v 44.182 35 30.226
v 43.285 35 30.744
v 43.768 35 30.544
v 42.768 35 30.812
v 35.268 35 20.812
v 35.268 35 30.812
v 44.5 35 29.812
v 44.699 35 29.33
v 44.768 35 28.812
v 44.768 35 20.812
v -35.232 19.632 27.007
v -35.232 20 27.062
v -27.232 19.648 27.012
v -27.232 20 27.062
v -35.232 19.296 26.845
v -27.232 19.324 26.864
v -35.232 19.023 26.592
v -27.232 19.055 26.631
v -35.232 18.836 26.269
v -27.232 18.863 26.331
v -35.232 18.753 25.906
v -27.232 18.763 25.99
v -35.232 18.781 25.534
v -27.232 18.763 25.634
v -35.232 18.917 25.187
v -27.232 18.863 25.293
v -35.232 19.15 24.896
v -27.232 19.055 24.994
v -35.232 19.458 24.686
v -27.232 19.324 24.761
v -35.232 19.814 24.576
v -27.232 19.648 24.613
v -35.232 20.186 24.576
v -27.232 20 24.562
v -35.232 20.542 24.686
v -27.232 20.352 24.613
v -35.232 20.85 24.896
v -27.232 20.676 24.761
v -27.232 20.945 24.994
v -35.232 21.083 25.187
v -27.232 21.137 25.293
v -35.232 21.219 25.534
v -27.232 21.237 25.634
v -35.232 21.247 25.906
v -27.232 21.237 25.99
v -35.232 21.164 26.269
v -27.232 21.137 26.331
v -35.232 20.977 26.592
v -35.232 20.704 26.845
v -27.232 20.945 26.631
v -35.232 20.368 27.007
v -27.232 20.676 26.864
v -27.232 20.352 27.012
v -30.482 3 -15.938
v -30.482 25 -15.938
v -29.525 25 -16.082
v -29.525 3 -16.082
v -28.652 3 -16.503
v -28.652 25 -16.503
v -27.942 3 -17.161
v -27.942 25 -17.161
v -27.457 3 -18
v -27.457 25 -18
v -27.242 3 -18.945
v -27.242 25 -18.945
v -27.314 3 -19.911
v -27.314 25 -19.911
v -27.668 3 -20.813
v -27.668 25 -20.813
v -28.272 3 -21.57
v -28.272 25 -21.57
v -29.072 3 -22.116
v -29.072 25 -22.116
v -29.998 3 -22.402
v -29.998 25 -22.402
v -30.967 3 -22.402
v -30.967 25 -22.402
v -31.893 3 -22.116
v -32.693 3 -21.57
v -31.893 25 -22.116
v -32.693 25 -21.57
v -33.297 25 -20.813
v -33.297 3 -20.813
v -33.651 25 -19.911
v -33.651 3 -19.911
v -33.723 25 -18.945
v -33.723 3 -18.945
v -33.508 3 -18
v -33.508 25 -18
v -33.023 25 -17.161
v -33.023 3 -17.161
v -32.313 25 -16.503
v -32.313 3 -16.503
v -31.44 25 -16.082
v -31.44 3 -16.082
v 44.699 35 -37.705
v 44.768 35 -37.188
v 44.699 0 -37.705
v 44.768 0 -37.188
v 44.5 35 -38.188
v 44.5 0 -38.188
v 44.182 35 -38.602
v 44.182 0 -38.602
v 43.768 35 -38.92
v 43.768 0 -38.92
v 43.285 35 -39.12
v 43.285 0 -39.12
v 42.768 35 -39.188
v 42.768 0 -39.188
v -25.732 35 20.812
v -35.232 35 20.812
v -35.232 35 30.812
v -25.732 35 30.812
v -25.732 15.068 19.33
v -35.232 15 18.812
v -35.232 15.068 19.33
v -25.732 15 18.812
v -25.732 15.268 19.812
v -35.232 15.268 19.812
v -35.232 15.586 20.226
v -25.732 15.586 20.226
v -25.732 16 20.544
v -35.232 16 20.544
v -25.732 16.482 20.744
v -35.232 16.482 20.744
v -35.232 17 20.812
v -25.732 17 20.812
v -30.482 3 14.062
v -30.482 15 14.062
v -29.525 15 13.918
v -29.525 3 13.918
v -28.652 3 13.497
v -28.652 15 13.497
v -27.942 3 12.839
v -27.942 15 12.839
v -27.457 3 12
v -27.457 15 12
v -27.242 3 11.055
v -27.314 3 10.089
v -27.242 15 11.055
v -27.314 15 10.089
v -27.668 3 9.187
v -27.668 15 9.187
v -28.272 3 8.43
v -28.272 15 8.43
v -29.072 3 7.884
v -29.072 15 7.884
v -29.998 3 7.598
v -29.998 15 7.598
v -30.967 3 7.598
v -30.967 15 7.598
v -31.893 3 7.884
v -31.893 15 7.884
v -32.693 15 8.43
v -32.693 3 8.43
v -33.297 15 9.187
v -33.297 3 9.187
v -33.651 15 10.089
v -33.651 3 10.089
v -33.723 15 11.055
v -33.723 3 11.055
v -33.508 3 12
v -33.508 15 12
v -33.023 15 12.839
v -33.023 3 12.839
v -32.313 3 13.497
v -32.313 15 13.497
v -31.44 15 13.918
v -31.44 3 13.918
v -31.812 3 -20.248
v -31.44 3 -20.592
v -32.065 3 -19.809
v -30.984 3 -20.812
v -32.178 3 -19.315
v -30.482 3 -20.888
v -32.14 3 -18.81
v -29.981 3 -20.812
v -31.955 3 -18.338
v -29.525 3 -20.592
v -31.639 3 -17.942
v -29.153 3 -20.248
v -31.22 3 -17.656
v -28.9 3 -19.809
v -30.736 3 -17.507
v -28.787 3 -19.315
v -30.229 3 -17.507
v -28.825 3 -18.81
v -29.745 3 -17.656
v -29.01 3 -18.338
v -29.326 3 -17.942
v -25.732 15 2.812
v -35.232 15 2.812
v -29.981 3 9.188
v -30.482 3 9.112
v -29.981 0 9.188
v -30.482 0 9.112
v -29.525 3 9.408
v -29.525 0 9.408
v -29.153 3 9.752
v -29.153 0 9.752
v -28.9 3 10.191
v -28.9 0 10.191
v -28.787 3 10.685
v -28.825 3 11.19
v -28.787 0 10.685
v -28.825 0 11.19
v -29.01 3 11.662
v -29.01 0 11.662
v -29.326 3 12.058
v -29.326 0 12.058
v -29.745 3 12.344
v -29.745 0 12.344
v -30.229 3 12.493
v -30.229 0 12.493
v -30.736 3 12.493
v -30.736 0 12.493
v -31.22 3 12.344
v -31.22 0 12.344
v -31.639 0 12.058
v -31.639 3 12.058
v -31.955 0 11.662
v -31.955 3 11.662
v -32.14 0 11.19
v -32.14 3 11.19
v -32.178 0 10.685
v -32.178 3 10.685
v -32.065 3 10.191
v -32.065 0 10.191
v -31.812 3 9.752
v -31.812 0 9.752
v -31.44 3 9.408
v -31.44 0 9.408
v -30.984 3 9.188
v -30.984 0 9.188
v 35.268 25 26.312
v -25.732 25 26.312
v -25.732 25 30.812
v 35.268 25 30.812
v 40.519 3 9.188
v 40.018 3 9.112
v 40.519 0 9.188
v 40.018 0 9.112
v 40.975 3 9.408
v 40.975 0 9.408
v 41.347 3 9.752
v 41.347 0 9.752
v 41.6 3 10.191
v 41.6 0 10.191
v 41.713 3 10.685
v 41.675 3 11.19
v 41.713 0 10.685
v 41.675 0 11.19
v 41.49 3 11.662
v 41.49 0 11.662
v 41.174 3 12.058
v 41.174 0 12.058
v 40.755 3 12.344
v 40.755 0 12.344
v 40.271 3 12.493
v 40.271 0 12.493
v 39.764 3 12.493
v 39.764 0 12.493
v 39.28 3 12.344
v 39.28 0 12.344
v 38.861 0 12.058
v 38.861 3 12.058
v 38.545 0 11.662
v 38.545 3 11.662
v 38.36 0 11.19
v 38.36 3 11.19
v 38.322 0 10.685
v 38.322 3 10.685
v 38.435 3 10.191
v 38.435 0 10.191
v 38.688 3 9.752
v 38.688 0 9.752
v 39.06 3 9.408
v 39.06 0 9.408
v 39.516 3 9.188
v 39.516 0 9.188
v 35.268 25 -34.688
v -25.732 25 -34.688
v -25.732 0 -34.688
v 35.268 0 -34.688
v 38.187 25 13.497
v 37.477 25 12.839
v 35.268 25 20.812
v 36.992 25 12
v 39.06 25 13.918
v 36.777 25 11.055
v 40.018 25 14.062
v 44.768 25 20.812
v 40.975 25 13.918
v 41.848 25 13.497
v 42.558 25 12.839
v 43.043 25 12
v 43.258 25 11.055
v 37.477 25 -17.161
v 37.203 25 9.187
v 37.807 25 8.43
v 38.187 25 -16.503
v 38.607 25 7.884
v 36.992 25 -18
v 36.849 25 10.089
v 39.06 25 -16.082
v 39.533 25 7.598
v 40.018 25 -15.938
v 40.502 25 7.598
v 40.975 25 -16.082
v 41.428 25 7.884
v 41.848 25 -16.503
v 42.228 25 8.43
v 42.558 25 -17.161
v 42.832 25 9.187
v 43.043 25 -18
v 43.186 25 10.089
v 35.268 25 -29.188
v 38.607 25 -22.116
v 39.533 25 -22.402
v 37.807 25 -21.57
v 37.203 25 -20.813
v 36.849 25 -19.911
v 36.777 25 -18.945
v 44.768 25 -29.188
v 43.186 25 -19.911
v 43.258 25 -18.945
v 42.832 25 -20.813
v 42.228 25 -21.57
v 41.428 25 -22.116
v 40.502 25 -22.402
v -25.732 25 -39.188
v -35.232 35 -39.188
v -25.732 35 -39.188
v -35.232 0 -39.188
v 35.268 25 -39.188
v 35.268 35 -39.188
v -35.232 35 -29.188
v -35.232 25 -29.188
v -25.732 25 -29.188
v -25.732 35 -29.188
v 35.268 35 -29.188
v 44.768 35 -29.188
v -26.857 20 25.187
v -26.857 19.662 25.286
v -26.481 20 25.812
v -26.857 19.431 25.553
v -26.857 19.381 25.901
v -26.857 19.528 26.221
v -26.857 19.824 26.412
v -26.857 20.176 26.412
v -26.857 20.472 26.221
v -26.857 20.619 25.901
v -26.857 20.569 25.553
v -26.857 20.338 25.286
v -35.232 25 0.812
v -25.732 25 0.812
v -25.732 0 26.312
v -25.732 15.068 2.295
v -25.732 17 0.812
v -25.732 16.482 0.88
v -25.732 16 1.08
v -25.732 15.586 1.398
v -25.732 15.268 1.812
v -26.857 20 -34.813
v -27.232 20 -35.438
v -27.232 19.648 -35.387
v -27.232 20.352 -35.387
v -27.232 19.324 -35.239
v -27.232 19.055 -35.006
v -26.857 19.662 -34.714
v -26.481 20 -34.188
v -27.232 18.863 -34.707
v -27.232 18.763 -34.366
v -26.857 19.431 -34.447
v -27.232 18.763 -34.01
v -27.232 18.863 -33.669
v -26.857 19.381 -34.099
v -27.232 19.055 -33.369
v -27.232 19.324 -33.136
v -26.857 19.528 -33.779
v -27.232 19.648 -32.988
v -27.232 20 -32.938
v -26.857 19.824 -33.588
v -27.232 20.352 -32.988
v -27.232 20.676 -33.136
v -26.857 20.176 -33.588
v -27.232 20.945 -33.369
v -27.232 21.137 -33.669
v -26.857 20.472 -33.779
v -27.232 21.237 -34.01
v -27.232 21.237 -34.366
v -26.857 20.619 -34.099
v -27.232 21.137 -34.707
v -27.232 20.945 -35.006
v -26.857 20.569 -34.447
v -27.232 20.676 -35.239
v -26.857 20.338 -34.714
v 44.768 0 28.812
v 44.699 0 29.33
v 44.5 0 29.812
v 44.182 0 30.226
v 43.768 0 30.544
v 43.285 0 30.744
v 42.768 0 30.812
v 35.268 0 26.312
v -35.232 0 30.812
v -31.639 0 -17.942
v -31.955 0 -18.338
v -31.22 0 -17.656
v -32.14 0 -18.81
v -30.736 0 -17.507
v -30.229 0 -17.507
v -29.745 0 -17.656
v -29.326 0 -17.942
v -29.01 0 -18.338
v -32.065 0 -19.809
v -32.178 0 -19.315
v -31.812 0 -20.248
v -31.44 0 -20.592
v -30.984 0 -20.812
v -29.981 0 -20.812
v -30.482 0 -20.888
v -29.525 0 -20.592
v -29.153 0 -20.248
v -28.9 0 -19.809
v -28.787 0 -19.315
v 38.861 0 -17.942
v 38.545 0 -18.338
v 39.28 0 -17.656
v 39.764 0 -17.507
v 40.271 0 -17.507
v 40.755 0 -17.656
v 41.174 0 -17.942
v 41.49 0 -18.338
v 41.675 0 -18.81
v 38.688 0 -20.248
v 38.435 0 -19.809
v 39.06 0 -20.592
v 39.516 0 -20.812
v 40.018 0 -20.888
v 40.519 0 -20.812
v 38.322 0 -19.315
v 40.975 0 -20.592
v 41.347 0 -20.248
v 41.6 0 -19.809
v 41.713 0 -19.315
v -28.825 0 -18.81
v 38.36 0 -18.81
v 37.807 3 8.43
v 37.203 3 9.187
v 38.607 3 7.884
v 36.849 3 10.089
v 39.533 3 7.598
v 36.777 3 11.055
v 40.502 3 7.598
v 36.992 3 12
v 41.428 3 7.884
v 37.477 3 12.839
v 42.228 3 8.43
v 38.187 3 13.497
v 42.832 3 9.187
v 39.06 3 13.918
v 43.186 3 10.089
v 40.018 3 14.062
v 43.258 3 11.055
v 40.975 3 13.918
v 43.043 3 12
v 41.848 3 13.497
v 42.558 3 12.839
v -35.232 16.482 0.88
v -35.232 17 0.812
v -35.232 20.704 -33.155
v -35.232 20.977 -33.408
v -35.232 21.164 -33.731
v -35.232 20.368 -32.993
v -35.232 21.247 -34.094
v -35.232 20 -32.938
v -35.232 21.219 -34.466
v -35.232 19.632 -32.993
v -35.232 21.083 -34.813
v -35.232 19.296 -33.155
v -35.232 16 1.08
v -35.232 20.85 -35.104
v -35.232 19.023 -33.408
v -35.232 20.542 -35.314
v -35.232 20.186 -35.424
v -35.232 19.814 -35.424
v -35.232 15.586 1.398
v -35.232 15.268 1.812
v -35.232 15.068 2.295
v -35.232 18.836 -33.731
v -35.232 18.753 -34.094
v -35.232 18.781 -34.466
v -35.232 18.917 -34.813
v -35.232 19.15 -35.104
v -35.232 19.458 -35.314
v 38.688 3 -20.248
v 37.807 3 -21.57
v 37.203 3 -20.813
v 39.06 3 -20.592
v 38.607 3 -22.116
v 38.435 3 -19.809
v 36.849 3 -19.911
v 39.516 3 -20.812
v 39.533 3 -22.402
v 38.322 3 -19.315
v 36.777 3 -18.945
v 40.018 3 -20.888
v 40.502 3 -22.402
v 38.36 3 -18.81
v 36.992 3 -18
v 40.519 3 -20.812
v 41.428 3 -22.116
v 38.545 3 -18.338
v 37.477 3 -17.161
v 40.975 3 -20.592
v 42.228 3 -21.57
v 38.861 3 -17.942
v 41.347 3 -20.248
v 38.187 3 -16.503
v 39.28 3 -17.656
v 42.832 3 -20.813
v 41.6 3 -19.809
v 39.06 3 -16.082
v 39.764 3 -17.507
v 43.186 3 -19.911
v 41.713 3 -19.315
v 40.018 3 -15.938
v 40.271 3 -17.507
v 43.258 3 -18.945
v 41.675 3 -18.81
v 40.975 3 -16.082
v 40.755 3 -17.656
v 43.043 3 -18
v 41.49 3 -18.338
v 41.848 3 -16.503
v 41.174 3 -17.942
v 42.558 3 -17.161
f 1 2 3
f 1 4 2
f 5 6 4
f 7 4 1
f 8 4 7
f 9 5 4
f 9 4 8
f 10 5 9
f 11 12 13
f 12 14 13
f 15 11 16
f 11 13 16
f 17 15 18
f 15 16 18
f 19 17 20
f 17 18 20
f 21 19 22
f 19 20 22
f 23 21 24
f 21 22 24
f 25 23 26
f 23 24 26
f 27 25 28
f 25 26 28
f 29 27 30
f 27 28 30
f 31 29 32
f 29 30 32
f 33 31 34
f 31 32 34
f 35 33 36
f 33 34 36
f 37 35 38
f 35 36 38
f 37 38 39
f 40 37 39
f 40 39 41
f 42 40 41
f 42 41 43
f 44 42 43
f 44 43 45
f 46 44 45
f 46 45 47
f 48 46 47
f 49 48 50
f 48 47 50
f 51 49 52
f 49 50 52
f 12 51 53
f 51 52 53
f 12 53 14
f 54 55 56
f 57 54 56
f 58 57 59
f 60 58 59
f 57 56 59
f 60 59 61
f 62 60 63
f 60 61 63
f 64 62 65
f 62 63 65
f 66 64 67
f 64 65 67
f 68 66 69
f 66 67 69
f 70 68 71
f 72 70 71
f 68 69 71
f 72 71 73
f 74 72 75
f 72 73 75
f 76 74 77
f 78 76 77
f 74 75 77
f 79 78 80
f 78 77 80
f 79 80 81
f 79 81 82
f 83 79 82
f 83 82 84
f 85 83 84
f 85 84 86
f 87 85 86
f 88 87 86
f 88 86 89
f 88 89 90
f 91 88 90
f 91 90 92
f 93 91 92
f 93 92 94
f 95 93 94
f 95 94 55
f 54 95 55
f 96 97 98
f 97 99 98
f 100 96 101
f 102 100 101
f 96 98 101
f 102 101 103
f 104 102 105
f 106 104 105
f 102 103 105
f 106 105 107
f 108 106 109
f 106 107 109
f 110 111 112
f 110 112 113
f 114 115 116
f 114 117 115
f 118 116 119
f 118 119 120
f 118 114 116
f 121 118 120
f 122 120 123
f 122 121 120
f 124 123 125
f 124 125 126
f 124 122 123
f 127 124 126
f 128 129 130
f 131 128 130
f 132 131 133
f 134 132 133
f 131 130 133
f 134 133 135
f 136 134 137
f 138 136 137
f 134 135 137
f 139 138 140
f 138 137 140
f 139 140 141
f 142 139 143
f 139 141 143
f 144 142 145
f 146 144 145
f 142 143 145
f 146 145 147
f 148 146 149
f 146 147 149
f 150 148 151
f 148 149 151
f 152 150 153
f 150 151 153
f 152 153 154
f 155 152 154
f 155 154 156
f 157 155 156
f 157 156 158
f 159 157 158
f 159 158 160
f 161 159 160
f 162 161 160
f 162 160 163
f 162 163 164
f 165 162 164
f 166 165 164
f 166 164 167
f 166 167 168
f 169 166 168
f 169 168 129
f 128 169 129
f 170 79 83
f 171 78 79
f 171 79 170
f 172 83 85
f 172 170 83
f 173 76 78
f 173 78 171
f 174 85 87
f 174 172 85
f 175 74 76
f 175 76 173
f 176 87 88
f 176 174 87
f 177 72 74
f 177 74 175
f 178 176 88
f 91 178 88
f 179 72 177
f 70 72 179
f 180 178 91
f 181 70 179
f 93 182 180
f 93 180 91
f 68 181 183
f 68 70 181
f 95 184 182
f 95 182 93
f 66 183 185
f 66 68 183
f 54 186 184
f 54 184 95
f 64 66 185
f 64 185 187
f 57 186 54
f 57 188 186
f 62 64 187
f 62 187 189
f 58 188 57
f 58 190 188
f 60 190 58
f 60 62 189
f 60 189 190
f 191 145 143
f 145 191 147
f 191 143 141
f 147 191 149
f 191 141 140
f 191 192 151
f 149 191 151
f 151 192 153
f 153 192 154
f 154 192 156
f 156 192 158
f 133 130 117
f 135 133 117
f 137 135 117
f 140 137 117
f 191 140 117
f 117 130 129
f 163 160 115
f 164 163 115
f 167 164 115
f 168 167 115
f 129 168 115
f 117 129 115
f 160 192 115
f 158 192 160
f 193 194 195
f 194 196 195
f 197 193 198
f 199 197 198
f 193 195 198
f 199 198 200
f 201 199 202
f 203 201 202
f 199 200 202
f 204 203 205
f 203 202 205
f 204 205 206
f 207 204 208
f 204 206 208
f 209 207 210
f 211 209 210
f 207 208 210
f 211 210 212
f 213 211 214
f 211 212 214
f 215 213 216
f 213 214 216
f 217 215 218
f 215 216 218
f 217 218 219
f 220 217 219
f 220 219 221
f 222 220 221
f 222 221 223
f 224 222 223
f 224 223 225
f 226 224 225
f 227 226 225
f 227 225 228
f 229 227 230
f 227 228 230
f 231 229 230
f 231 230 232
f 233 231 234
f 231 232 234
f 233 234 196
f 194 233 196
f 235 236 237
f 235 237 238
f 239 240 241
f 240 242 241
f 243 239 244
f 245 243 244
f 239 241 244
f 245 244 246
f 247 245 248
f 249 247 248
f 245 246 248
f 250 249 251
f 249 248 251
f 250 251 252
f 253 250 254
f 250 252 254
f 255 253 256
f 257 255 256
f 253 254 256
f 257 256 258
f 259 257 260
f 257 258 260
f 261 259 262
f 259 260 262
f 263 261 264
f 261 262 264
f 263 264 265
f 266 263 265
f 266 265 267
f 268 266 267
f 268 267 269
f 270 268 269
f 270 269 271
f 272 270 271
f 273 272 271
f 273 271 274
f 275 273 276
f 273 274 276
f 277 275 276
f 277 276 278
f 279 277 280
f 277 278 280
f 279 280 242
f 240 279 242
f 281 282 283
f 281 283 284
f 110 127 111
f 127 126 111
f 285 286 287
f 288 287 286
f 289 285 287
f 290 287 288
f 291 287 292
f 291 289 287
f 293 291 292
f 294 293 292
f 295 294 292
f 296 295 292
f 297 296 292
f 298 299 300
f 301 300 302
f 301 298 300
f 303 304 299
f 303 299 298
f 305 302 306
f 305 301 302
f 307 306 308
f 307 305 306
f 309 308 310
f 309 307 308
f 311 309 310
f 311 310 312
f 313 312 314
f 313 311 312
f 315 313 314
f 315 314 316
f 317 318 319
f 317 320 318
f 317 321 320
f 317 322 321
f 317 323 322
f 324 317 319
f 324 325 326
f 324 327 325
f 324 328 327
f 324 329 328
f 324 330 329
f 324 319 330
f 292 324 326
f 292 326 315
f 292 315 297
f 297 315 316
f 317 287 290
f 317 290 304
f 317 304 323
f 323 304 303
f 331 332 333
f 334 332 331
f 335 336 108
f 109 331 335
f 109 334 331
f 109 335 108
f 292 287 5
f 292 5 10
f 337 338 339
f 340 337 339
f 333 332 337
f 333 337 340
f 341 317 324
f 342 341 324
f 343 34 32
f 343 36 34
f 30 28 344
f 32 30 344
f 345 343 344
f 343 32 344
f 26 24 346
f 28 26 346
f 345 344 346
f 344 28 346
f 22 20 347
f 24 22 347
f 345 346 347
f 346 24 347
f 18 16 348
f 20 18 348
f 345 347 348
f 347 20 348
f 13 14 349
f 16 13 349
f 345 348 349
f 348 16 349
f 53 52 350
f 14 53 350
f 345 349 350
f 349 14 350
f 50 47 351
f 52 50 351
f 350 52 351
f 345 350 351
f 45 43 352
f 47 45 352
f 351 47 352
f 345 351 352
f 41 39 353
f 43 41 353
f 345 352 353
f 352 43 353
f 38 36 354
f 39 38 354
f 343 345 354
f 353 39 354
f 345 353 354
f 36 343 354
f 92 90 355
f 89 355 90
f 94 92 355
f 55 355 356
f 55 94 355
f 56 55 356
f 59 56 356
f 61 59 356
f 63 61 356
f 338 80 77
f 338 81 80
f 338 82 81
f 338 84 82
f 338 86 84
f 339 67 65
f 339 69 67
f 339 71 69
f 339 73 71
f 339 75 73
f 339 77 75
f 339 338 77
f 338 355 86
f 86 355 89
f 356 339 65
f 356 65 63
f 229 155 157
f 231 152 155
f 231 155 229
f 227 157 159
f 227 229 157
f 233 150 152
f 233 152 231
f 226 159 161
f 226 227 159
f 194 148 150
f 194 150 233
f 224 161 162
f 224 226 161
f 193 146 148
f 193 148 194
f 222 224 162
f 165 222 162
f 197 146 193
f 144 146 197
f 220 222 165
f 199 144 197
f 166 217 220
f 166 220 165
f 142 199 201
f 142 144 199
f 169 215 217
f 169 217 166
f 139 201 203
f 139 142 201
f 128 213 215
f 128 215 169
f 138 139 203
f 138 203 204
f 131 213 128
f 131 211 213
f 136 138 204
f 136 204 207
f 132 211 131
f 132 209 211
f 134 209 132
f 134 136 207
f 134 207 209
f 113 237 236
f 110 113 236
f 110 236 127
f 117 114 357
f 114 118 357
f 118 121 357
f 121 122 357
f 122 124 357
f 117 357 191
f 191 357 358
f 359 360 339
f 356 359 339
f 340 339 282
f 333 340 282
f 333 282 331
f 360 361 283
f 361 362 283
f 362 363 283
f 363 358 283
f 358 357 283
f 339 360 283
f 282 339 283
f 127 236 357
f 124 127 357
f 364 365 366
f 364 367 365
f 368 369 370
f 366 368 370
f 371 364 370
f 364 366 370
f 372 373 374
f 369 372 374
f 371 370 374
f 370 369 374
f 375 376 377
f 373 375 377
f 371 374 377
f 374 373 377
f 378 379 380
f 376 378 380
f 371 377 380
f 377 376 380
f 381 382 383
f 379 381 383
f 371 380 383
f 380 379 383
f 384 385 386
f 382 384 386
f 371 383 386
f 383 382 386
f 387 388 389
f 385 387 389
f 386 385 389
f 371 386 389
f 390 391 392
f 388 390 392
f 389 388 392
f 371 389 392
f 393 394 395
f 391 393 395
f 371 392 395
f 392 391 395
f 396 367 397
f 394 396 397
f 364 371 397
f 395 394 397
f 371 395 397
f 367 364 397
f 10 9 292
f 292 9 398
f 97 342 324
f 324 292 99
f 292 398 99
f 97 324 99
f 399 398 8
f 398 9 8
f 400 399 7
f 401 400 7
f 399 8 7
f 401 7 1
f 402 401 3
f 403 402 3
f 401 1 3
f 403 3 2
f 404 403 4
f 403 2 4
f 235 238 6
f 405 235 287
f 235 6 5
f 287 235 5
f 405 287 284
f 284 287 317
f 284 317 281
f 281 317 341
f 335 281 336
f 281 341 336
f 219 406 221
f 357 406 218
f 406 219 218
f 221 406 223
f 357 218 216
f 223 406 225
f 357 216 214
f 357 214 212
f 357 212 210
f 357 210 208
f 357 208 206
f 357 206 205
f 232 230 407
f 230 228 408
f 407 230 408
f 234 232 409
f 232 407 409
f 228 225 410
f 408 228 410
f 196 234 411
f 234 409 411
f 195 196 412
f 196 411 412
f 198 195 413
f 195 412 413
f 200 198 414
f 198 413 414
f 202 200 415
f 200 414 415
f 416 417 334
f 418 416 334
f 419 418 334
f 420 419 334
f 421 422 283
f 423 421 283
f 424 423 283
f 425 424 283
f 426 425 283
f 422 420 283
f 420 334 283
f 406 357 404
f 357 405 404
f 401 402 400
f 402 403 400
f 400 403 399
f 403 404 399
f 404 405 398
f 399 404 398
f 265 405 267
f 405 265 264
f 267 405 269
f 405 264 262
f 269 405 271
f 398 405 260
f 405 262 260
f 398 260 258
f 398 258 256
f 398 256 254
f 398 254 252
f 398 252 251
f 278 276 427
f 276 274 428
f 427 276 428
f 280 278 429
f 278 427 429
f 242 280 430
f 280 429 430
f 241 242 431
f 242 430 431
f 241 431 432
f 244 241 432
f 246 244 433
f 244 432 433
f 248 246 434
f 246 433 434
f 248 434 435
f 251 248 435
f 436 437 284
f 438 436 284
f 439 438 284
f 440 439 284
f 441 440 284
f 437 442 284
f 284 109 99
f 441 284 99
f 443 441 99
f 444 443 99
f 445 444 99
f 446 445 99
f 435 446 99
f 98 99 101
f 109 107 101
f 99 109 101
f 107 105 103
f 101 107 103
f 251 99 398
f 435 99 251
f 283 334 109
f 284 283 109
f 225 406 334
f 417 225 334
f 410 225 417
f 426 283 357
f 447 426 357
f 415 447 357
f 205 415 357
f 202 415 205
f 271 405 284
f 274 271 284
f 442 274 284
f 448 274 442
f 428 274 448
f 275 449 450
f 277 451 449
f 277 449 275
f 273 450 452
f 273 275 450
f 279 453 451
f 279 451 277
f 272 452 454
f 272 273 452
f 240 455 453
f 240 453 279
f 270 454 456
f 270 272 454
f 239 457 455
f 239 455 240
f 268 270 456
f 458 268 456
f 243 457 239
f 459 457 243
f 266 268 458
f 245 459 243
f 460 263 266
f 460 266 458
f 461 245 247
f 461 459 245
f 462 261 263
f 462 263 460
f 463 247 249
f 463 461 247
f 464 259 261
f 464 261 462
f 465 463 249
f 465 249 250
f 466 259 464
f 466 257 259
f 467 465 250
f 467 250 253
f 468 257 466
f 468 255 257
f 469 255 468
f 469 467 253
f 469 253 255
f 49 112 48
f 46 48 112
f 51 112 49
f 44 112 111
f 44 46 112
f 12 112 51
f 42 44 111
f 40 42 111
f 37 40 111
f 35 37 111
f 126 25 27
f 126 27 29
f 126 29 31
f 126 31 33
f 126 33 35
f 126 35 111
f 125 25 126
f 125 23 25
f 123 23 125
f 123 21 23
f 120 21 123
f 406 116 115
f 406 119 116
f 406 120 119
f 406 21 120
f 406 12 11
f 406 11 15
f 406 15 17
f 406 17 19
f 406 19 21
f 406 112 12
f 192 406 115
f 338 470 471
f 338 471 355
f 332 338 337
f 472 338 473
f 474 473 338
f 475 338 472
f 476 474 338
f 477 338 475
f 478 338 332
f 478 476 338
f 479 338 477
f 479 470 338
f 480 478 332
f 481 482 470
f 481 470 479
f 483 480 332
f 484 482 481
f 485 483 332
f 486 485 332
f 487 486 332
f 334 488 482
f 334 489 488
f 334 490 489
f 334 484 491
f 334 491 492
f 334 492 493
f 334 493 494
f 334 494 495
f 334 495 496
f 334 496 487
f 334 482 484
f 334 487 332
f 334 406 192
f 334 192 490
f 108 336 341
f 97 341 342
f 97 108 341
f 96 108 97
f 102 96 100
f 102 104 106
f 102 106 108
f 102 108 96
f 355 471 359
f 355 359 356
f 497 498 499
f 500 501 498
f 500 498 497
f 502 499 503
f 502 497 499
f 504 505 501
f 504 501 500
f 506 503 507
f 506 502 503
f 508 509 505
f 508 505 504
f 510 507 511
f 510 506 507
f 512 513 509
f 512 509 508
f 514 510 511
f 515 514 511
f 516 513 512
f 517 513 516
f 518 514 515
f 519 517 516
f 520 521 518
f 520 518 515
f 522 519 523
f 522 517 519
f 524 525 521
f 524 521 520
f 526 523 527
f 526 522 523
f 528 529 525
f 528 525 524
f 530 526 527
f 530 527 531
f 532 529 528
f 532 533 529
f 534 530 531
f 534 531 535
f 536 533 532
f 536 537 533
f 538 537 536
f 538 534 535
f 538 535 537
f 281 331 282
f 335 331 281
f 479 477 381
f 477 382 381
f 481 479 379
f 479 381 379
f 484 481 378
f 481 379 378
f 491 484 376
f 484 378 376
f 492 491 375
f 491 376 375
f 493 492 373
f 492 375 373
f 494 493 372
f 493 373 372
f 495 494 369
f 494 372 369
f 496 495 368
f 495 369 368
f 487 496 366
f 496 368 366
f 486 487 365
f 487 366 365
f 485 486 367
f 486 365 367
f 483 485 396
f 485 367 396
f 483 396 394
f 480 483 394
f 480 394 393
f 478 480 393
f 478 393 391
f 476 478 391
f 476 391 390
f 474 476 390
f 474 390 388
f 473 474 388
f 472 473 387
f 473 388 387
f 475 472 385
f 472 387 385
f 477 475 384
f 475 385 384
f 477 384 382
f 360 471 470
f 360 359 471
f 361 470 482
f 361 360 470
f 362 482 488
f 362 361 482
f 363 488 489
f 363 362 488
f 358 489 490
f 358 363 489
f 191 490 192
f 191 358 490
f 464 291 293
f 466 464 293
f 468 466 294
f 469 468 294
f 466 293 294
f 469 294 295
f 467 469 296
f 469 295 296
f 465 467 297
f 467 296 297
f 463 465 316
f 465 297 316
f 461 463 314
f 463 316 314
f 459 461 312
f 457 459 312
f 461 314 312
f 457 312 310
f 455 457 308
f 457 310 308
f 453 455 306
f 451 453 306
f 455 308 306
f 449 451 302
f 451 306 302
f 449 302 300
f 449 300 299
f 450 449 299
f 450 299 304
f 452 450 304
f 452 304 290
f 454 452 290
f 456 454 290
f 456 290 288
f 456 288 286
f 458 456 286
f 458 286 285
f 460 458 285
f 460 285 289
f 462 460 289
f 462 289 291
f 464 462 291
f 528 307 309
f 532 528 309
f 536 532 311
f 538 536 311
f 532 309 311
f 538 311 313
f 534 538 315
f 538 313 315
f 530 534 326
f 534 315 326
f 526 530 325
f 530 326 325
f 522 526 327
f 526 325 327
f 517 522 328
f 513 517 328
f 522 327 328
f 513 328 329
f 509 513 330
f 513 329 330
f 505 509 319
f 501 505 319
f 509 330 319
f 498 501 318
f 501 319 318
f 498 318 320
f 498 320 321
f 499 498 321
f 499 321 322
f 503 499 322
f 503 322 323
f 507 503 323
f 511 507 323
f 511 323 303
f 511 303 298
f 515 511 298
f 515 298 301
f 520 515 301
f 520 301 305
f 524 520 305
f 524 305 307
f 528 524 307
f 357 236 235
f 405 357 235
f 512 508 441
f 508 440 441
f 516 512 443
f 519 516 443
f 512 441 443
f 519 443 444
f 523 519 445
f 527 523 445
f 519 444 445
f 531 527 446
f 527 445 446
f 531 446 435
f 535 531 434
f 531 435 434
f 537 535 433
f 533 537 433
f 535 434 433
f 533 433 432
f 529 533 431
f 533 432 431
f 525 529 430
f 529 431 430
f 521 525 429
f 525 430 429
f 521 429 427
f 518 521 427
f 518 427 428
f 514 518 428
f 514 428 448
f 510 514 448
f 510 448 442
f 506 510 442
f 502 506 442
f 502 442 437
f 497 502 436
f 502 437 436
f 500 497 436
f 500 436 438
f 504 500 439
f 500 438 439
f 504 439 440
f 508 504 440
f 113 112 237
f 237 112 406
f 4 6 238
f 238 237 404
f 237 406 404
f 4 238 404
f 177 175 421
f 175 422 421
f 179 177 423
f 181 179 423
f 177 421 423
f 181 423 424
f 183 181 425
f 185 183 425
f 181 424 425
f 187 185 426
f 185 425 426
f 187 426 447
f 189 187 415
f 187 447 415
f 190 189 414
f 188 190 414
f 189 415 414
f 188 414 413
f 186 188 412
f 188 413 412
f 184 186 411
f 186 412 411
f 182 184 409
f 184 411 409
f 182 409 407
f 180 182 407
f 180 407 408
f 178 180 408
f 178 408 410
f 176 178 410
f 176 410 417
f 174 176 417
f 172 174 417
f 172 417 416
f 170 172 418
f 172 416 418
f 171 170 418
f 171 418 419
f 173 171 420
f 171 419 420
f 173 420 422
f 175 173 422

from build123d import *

# Parameters (mm, degrees)
SKETCH1_W                       = 80
SKETCH1_H                       = 70
BOSS_EXTRUDE1_DEPTH             = 25
SKETCH2_W                       = 61
SKETCH2_H                       = 61
CUT_EXTRUDE1_DEPTH              = 26
SKETCH3_W                       = 9.5
SKETCH3_H                       = 10
BOSS_EXTRUDE2_DEPTH             = 10
FILLET1_R                       = 2
FILLET4_R                       = 2
CBORE_FOR_M3_SHCS1_D            = 3.4
CBORE_FOR_M3_SHCS1_CBORE_D      = 6.5
CBORE_FOR_M3_SHCS1_CBORE_DEPTH  = 22
TAP_DRILL_FOR_M3X0_5_TAP1_D     = 2.5
TAP_DRILL_FOR_M3X0_5_TAP1_DEPTH = 8
TAP_DRILL_FOR_M3X0_5_TAP1_TIP   = 0.751075774
CUT_EXTRUDE2_REACH              = 82
SKETCH9_W                       = 20
SKETCH9_H                       = 10
FILLET5_R                       = 2


with BuildPart() as part:
    # Sketch1 → Boss-Extrude1 (new body)
    with BuildSketch(Plane(origin=(0, 0, 0), x_dir=(1, 0, 0), z_dir=(0, 1, 0))):
        with Locations((4.767506632, 4.187819453)):
            Rectangle(SKETCH1_W, SKETCH1_H)
    extrude(amount=BOSS_EXTRUDE1_DEPTH)

    # Sketch2 → Cut-Extrude1 (cut, through all)
    with BuildSketch(Plane(origin=(0, 25, 0), x_dir=(1, 0, 0), z_dir=(0, 1, 0))):
        with Locations((4.767506632, 4.187819453)):
            Rectangle(SKETCH2_W, SKETCH2_H)
    extrude(amount=-CUT_EXTRUDE1_DEPTH, mode=Mode.SUBTRACT)

    # Sketch3 → Boss-Extrude2 (add)
    with BuildSketch(Plane(origin=(0, 25, 0), x_dir=(1, 0, 0), z_dir=(0, 1, 0))):
        with Locations((-30.482493368, 34.187819453)):
            Rectangle(SKETCH3_W, SKETCH3_H)
        with Locations((40.017506632, 34.187819453)):
            Rectangle(SKETCH3_W, SKETCH3_H)
        with Locations((-30.482493368, -25.812180547)):
            Rectangle(SKETCH3_W, SKETCH3_H)
        with Locations((40.017506632, -25.812180547)):
            Rectangle(SKETCH3_W, SKETCH3_H)
    extrude(amount=BOSS_EXTRUDE2_DEPTH)

    # Fillet1
    fillet1_edges = [part.edges().sort_by_distance(p)[0] for p in [
        (44.767506632, 17.5, 30.812180547),
    ]]
    fillet(fillet1_edges, radius=FILLET1_R)

    # Fillet4
    fillet4_edges = [part.edges().sort_by_distance(p)[0] for p in [
        (44.767506632, 17.5, -39.187819453),
    ]]
    fillet(fillet4_edges, radius=FILLET4_R)

    # CBORE for M3 SHCS1 (through all)
    with Locations(Plane(origin=(-30.482493368, 25, -19.187819453), x_dir=(0, 0, 1), z_dir=(0, 1, 0))):
        with Locations((0, 0), (30, 0), (30, 70.5), (0, 70.5)):
            CounterBoreHole(CBORE_FOR_M3_SHCS1_D / 2, CBORE_FOR_M3_SHCS1_CBORE_D / 2, CBORE_FOR_M3_SHCS1_CBORE_DEPTH)

    # Tap Drill for M3x0.5 Tap1
    with Locations(Plane(origin=(-35.232493368, 20, 25.812180547), x_dir=(0, 0, -1), z_dir=(-1, 0, 0))):
        with Locations((0, 0), (60, 0)):
            Hole(TAP_DRILL_FOR_M3X0_5_TAP1_D / 2, depth=TAP_DRILL_FOR_M3X0_5_TAP1_DEPTH)
            with Locations((0, 0, -(TAP_DRILL_FOR_M3X0_5_TAP1_DEPTH + TAP_DRILL_FOR_M3X0_5_TAP1_TIP / 2))):  # 118° drill point
                Cone(0, TAP_DRILL_FOR_M3X0_5_TAP1_D / 2, TAP_DRILL_FOR_M3X0_5_TAP1_TIP, mode=Mode.SUBTRACT)

    # Sketch9 → Cut-Extrude2 (cut, up to next)
    with BuildSketch(Plane.ZY.offset(35.232493368), mode=Mode.PRIVATE) as cut_extrude2_sk1:
        with Locations((10.812180547, 20)):
            Rectangle(SKETCH9_W, SKETCH9_H)
    cut_extrude2_tool1 = extrude(cut_extrude2_sk1.sketch, amount=-CUT_EXTRUDE2_REACH, mode=Mode.PRIVATE) & part.part
    add(cut_extrude2_tool1.solids().sort_by_distance((-35.232493, 20, 10.812181))[0], mode=Mode.SUBTRACT)

    # Fillet5
    fillet5_edges = [part.edges().sort_by_distance(p)[0] for p in [
        (-30.482493368, 15, 0.812180547),
        (-30.482493368, 15, 20.812180547),
    ]]
    fillet(fillet5_edges, radius=FILLET5_R)


solid = part.part
